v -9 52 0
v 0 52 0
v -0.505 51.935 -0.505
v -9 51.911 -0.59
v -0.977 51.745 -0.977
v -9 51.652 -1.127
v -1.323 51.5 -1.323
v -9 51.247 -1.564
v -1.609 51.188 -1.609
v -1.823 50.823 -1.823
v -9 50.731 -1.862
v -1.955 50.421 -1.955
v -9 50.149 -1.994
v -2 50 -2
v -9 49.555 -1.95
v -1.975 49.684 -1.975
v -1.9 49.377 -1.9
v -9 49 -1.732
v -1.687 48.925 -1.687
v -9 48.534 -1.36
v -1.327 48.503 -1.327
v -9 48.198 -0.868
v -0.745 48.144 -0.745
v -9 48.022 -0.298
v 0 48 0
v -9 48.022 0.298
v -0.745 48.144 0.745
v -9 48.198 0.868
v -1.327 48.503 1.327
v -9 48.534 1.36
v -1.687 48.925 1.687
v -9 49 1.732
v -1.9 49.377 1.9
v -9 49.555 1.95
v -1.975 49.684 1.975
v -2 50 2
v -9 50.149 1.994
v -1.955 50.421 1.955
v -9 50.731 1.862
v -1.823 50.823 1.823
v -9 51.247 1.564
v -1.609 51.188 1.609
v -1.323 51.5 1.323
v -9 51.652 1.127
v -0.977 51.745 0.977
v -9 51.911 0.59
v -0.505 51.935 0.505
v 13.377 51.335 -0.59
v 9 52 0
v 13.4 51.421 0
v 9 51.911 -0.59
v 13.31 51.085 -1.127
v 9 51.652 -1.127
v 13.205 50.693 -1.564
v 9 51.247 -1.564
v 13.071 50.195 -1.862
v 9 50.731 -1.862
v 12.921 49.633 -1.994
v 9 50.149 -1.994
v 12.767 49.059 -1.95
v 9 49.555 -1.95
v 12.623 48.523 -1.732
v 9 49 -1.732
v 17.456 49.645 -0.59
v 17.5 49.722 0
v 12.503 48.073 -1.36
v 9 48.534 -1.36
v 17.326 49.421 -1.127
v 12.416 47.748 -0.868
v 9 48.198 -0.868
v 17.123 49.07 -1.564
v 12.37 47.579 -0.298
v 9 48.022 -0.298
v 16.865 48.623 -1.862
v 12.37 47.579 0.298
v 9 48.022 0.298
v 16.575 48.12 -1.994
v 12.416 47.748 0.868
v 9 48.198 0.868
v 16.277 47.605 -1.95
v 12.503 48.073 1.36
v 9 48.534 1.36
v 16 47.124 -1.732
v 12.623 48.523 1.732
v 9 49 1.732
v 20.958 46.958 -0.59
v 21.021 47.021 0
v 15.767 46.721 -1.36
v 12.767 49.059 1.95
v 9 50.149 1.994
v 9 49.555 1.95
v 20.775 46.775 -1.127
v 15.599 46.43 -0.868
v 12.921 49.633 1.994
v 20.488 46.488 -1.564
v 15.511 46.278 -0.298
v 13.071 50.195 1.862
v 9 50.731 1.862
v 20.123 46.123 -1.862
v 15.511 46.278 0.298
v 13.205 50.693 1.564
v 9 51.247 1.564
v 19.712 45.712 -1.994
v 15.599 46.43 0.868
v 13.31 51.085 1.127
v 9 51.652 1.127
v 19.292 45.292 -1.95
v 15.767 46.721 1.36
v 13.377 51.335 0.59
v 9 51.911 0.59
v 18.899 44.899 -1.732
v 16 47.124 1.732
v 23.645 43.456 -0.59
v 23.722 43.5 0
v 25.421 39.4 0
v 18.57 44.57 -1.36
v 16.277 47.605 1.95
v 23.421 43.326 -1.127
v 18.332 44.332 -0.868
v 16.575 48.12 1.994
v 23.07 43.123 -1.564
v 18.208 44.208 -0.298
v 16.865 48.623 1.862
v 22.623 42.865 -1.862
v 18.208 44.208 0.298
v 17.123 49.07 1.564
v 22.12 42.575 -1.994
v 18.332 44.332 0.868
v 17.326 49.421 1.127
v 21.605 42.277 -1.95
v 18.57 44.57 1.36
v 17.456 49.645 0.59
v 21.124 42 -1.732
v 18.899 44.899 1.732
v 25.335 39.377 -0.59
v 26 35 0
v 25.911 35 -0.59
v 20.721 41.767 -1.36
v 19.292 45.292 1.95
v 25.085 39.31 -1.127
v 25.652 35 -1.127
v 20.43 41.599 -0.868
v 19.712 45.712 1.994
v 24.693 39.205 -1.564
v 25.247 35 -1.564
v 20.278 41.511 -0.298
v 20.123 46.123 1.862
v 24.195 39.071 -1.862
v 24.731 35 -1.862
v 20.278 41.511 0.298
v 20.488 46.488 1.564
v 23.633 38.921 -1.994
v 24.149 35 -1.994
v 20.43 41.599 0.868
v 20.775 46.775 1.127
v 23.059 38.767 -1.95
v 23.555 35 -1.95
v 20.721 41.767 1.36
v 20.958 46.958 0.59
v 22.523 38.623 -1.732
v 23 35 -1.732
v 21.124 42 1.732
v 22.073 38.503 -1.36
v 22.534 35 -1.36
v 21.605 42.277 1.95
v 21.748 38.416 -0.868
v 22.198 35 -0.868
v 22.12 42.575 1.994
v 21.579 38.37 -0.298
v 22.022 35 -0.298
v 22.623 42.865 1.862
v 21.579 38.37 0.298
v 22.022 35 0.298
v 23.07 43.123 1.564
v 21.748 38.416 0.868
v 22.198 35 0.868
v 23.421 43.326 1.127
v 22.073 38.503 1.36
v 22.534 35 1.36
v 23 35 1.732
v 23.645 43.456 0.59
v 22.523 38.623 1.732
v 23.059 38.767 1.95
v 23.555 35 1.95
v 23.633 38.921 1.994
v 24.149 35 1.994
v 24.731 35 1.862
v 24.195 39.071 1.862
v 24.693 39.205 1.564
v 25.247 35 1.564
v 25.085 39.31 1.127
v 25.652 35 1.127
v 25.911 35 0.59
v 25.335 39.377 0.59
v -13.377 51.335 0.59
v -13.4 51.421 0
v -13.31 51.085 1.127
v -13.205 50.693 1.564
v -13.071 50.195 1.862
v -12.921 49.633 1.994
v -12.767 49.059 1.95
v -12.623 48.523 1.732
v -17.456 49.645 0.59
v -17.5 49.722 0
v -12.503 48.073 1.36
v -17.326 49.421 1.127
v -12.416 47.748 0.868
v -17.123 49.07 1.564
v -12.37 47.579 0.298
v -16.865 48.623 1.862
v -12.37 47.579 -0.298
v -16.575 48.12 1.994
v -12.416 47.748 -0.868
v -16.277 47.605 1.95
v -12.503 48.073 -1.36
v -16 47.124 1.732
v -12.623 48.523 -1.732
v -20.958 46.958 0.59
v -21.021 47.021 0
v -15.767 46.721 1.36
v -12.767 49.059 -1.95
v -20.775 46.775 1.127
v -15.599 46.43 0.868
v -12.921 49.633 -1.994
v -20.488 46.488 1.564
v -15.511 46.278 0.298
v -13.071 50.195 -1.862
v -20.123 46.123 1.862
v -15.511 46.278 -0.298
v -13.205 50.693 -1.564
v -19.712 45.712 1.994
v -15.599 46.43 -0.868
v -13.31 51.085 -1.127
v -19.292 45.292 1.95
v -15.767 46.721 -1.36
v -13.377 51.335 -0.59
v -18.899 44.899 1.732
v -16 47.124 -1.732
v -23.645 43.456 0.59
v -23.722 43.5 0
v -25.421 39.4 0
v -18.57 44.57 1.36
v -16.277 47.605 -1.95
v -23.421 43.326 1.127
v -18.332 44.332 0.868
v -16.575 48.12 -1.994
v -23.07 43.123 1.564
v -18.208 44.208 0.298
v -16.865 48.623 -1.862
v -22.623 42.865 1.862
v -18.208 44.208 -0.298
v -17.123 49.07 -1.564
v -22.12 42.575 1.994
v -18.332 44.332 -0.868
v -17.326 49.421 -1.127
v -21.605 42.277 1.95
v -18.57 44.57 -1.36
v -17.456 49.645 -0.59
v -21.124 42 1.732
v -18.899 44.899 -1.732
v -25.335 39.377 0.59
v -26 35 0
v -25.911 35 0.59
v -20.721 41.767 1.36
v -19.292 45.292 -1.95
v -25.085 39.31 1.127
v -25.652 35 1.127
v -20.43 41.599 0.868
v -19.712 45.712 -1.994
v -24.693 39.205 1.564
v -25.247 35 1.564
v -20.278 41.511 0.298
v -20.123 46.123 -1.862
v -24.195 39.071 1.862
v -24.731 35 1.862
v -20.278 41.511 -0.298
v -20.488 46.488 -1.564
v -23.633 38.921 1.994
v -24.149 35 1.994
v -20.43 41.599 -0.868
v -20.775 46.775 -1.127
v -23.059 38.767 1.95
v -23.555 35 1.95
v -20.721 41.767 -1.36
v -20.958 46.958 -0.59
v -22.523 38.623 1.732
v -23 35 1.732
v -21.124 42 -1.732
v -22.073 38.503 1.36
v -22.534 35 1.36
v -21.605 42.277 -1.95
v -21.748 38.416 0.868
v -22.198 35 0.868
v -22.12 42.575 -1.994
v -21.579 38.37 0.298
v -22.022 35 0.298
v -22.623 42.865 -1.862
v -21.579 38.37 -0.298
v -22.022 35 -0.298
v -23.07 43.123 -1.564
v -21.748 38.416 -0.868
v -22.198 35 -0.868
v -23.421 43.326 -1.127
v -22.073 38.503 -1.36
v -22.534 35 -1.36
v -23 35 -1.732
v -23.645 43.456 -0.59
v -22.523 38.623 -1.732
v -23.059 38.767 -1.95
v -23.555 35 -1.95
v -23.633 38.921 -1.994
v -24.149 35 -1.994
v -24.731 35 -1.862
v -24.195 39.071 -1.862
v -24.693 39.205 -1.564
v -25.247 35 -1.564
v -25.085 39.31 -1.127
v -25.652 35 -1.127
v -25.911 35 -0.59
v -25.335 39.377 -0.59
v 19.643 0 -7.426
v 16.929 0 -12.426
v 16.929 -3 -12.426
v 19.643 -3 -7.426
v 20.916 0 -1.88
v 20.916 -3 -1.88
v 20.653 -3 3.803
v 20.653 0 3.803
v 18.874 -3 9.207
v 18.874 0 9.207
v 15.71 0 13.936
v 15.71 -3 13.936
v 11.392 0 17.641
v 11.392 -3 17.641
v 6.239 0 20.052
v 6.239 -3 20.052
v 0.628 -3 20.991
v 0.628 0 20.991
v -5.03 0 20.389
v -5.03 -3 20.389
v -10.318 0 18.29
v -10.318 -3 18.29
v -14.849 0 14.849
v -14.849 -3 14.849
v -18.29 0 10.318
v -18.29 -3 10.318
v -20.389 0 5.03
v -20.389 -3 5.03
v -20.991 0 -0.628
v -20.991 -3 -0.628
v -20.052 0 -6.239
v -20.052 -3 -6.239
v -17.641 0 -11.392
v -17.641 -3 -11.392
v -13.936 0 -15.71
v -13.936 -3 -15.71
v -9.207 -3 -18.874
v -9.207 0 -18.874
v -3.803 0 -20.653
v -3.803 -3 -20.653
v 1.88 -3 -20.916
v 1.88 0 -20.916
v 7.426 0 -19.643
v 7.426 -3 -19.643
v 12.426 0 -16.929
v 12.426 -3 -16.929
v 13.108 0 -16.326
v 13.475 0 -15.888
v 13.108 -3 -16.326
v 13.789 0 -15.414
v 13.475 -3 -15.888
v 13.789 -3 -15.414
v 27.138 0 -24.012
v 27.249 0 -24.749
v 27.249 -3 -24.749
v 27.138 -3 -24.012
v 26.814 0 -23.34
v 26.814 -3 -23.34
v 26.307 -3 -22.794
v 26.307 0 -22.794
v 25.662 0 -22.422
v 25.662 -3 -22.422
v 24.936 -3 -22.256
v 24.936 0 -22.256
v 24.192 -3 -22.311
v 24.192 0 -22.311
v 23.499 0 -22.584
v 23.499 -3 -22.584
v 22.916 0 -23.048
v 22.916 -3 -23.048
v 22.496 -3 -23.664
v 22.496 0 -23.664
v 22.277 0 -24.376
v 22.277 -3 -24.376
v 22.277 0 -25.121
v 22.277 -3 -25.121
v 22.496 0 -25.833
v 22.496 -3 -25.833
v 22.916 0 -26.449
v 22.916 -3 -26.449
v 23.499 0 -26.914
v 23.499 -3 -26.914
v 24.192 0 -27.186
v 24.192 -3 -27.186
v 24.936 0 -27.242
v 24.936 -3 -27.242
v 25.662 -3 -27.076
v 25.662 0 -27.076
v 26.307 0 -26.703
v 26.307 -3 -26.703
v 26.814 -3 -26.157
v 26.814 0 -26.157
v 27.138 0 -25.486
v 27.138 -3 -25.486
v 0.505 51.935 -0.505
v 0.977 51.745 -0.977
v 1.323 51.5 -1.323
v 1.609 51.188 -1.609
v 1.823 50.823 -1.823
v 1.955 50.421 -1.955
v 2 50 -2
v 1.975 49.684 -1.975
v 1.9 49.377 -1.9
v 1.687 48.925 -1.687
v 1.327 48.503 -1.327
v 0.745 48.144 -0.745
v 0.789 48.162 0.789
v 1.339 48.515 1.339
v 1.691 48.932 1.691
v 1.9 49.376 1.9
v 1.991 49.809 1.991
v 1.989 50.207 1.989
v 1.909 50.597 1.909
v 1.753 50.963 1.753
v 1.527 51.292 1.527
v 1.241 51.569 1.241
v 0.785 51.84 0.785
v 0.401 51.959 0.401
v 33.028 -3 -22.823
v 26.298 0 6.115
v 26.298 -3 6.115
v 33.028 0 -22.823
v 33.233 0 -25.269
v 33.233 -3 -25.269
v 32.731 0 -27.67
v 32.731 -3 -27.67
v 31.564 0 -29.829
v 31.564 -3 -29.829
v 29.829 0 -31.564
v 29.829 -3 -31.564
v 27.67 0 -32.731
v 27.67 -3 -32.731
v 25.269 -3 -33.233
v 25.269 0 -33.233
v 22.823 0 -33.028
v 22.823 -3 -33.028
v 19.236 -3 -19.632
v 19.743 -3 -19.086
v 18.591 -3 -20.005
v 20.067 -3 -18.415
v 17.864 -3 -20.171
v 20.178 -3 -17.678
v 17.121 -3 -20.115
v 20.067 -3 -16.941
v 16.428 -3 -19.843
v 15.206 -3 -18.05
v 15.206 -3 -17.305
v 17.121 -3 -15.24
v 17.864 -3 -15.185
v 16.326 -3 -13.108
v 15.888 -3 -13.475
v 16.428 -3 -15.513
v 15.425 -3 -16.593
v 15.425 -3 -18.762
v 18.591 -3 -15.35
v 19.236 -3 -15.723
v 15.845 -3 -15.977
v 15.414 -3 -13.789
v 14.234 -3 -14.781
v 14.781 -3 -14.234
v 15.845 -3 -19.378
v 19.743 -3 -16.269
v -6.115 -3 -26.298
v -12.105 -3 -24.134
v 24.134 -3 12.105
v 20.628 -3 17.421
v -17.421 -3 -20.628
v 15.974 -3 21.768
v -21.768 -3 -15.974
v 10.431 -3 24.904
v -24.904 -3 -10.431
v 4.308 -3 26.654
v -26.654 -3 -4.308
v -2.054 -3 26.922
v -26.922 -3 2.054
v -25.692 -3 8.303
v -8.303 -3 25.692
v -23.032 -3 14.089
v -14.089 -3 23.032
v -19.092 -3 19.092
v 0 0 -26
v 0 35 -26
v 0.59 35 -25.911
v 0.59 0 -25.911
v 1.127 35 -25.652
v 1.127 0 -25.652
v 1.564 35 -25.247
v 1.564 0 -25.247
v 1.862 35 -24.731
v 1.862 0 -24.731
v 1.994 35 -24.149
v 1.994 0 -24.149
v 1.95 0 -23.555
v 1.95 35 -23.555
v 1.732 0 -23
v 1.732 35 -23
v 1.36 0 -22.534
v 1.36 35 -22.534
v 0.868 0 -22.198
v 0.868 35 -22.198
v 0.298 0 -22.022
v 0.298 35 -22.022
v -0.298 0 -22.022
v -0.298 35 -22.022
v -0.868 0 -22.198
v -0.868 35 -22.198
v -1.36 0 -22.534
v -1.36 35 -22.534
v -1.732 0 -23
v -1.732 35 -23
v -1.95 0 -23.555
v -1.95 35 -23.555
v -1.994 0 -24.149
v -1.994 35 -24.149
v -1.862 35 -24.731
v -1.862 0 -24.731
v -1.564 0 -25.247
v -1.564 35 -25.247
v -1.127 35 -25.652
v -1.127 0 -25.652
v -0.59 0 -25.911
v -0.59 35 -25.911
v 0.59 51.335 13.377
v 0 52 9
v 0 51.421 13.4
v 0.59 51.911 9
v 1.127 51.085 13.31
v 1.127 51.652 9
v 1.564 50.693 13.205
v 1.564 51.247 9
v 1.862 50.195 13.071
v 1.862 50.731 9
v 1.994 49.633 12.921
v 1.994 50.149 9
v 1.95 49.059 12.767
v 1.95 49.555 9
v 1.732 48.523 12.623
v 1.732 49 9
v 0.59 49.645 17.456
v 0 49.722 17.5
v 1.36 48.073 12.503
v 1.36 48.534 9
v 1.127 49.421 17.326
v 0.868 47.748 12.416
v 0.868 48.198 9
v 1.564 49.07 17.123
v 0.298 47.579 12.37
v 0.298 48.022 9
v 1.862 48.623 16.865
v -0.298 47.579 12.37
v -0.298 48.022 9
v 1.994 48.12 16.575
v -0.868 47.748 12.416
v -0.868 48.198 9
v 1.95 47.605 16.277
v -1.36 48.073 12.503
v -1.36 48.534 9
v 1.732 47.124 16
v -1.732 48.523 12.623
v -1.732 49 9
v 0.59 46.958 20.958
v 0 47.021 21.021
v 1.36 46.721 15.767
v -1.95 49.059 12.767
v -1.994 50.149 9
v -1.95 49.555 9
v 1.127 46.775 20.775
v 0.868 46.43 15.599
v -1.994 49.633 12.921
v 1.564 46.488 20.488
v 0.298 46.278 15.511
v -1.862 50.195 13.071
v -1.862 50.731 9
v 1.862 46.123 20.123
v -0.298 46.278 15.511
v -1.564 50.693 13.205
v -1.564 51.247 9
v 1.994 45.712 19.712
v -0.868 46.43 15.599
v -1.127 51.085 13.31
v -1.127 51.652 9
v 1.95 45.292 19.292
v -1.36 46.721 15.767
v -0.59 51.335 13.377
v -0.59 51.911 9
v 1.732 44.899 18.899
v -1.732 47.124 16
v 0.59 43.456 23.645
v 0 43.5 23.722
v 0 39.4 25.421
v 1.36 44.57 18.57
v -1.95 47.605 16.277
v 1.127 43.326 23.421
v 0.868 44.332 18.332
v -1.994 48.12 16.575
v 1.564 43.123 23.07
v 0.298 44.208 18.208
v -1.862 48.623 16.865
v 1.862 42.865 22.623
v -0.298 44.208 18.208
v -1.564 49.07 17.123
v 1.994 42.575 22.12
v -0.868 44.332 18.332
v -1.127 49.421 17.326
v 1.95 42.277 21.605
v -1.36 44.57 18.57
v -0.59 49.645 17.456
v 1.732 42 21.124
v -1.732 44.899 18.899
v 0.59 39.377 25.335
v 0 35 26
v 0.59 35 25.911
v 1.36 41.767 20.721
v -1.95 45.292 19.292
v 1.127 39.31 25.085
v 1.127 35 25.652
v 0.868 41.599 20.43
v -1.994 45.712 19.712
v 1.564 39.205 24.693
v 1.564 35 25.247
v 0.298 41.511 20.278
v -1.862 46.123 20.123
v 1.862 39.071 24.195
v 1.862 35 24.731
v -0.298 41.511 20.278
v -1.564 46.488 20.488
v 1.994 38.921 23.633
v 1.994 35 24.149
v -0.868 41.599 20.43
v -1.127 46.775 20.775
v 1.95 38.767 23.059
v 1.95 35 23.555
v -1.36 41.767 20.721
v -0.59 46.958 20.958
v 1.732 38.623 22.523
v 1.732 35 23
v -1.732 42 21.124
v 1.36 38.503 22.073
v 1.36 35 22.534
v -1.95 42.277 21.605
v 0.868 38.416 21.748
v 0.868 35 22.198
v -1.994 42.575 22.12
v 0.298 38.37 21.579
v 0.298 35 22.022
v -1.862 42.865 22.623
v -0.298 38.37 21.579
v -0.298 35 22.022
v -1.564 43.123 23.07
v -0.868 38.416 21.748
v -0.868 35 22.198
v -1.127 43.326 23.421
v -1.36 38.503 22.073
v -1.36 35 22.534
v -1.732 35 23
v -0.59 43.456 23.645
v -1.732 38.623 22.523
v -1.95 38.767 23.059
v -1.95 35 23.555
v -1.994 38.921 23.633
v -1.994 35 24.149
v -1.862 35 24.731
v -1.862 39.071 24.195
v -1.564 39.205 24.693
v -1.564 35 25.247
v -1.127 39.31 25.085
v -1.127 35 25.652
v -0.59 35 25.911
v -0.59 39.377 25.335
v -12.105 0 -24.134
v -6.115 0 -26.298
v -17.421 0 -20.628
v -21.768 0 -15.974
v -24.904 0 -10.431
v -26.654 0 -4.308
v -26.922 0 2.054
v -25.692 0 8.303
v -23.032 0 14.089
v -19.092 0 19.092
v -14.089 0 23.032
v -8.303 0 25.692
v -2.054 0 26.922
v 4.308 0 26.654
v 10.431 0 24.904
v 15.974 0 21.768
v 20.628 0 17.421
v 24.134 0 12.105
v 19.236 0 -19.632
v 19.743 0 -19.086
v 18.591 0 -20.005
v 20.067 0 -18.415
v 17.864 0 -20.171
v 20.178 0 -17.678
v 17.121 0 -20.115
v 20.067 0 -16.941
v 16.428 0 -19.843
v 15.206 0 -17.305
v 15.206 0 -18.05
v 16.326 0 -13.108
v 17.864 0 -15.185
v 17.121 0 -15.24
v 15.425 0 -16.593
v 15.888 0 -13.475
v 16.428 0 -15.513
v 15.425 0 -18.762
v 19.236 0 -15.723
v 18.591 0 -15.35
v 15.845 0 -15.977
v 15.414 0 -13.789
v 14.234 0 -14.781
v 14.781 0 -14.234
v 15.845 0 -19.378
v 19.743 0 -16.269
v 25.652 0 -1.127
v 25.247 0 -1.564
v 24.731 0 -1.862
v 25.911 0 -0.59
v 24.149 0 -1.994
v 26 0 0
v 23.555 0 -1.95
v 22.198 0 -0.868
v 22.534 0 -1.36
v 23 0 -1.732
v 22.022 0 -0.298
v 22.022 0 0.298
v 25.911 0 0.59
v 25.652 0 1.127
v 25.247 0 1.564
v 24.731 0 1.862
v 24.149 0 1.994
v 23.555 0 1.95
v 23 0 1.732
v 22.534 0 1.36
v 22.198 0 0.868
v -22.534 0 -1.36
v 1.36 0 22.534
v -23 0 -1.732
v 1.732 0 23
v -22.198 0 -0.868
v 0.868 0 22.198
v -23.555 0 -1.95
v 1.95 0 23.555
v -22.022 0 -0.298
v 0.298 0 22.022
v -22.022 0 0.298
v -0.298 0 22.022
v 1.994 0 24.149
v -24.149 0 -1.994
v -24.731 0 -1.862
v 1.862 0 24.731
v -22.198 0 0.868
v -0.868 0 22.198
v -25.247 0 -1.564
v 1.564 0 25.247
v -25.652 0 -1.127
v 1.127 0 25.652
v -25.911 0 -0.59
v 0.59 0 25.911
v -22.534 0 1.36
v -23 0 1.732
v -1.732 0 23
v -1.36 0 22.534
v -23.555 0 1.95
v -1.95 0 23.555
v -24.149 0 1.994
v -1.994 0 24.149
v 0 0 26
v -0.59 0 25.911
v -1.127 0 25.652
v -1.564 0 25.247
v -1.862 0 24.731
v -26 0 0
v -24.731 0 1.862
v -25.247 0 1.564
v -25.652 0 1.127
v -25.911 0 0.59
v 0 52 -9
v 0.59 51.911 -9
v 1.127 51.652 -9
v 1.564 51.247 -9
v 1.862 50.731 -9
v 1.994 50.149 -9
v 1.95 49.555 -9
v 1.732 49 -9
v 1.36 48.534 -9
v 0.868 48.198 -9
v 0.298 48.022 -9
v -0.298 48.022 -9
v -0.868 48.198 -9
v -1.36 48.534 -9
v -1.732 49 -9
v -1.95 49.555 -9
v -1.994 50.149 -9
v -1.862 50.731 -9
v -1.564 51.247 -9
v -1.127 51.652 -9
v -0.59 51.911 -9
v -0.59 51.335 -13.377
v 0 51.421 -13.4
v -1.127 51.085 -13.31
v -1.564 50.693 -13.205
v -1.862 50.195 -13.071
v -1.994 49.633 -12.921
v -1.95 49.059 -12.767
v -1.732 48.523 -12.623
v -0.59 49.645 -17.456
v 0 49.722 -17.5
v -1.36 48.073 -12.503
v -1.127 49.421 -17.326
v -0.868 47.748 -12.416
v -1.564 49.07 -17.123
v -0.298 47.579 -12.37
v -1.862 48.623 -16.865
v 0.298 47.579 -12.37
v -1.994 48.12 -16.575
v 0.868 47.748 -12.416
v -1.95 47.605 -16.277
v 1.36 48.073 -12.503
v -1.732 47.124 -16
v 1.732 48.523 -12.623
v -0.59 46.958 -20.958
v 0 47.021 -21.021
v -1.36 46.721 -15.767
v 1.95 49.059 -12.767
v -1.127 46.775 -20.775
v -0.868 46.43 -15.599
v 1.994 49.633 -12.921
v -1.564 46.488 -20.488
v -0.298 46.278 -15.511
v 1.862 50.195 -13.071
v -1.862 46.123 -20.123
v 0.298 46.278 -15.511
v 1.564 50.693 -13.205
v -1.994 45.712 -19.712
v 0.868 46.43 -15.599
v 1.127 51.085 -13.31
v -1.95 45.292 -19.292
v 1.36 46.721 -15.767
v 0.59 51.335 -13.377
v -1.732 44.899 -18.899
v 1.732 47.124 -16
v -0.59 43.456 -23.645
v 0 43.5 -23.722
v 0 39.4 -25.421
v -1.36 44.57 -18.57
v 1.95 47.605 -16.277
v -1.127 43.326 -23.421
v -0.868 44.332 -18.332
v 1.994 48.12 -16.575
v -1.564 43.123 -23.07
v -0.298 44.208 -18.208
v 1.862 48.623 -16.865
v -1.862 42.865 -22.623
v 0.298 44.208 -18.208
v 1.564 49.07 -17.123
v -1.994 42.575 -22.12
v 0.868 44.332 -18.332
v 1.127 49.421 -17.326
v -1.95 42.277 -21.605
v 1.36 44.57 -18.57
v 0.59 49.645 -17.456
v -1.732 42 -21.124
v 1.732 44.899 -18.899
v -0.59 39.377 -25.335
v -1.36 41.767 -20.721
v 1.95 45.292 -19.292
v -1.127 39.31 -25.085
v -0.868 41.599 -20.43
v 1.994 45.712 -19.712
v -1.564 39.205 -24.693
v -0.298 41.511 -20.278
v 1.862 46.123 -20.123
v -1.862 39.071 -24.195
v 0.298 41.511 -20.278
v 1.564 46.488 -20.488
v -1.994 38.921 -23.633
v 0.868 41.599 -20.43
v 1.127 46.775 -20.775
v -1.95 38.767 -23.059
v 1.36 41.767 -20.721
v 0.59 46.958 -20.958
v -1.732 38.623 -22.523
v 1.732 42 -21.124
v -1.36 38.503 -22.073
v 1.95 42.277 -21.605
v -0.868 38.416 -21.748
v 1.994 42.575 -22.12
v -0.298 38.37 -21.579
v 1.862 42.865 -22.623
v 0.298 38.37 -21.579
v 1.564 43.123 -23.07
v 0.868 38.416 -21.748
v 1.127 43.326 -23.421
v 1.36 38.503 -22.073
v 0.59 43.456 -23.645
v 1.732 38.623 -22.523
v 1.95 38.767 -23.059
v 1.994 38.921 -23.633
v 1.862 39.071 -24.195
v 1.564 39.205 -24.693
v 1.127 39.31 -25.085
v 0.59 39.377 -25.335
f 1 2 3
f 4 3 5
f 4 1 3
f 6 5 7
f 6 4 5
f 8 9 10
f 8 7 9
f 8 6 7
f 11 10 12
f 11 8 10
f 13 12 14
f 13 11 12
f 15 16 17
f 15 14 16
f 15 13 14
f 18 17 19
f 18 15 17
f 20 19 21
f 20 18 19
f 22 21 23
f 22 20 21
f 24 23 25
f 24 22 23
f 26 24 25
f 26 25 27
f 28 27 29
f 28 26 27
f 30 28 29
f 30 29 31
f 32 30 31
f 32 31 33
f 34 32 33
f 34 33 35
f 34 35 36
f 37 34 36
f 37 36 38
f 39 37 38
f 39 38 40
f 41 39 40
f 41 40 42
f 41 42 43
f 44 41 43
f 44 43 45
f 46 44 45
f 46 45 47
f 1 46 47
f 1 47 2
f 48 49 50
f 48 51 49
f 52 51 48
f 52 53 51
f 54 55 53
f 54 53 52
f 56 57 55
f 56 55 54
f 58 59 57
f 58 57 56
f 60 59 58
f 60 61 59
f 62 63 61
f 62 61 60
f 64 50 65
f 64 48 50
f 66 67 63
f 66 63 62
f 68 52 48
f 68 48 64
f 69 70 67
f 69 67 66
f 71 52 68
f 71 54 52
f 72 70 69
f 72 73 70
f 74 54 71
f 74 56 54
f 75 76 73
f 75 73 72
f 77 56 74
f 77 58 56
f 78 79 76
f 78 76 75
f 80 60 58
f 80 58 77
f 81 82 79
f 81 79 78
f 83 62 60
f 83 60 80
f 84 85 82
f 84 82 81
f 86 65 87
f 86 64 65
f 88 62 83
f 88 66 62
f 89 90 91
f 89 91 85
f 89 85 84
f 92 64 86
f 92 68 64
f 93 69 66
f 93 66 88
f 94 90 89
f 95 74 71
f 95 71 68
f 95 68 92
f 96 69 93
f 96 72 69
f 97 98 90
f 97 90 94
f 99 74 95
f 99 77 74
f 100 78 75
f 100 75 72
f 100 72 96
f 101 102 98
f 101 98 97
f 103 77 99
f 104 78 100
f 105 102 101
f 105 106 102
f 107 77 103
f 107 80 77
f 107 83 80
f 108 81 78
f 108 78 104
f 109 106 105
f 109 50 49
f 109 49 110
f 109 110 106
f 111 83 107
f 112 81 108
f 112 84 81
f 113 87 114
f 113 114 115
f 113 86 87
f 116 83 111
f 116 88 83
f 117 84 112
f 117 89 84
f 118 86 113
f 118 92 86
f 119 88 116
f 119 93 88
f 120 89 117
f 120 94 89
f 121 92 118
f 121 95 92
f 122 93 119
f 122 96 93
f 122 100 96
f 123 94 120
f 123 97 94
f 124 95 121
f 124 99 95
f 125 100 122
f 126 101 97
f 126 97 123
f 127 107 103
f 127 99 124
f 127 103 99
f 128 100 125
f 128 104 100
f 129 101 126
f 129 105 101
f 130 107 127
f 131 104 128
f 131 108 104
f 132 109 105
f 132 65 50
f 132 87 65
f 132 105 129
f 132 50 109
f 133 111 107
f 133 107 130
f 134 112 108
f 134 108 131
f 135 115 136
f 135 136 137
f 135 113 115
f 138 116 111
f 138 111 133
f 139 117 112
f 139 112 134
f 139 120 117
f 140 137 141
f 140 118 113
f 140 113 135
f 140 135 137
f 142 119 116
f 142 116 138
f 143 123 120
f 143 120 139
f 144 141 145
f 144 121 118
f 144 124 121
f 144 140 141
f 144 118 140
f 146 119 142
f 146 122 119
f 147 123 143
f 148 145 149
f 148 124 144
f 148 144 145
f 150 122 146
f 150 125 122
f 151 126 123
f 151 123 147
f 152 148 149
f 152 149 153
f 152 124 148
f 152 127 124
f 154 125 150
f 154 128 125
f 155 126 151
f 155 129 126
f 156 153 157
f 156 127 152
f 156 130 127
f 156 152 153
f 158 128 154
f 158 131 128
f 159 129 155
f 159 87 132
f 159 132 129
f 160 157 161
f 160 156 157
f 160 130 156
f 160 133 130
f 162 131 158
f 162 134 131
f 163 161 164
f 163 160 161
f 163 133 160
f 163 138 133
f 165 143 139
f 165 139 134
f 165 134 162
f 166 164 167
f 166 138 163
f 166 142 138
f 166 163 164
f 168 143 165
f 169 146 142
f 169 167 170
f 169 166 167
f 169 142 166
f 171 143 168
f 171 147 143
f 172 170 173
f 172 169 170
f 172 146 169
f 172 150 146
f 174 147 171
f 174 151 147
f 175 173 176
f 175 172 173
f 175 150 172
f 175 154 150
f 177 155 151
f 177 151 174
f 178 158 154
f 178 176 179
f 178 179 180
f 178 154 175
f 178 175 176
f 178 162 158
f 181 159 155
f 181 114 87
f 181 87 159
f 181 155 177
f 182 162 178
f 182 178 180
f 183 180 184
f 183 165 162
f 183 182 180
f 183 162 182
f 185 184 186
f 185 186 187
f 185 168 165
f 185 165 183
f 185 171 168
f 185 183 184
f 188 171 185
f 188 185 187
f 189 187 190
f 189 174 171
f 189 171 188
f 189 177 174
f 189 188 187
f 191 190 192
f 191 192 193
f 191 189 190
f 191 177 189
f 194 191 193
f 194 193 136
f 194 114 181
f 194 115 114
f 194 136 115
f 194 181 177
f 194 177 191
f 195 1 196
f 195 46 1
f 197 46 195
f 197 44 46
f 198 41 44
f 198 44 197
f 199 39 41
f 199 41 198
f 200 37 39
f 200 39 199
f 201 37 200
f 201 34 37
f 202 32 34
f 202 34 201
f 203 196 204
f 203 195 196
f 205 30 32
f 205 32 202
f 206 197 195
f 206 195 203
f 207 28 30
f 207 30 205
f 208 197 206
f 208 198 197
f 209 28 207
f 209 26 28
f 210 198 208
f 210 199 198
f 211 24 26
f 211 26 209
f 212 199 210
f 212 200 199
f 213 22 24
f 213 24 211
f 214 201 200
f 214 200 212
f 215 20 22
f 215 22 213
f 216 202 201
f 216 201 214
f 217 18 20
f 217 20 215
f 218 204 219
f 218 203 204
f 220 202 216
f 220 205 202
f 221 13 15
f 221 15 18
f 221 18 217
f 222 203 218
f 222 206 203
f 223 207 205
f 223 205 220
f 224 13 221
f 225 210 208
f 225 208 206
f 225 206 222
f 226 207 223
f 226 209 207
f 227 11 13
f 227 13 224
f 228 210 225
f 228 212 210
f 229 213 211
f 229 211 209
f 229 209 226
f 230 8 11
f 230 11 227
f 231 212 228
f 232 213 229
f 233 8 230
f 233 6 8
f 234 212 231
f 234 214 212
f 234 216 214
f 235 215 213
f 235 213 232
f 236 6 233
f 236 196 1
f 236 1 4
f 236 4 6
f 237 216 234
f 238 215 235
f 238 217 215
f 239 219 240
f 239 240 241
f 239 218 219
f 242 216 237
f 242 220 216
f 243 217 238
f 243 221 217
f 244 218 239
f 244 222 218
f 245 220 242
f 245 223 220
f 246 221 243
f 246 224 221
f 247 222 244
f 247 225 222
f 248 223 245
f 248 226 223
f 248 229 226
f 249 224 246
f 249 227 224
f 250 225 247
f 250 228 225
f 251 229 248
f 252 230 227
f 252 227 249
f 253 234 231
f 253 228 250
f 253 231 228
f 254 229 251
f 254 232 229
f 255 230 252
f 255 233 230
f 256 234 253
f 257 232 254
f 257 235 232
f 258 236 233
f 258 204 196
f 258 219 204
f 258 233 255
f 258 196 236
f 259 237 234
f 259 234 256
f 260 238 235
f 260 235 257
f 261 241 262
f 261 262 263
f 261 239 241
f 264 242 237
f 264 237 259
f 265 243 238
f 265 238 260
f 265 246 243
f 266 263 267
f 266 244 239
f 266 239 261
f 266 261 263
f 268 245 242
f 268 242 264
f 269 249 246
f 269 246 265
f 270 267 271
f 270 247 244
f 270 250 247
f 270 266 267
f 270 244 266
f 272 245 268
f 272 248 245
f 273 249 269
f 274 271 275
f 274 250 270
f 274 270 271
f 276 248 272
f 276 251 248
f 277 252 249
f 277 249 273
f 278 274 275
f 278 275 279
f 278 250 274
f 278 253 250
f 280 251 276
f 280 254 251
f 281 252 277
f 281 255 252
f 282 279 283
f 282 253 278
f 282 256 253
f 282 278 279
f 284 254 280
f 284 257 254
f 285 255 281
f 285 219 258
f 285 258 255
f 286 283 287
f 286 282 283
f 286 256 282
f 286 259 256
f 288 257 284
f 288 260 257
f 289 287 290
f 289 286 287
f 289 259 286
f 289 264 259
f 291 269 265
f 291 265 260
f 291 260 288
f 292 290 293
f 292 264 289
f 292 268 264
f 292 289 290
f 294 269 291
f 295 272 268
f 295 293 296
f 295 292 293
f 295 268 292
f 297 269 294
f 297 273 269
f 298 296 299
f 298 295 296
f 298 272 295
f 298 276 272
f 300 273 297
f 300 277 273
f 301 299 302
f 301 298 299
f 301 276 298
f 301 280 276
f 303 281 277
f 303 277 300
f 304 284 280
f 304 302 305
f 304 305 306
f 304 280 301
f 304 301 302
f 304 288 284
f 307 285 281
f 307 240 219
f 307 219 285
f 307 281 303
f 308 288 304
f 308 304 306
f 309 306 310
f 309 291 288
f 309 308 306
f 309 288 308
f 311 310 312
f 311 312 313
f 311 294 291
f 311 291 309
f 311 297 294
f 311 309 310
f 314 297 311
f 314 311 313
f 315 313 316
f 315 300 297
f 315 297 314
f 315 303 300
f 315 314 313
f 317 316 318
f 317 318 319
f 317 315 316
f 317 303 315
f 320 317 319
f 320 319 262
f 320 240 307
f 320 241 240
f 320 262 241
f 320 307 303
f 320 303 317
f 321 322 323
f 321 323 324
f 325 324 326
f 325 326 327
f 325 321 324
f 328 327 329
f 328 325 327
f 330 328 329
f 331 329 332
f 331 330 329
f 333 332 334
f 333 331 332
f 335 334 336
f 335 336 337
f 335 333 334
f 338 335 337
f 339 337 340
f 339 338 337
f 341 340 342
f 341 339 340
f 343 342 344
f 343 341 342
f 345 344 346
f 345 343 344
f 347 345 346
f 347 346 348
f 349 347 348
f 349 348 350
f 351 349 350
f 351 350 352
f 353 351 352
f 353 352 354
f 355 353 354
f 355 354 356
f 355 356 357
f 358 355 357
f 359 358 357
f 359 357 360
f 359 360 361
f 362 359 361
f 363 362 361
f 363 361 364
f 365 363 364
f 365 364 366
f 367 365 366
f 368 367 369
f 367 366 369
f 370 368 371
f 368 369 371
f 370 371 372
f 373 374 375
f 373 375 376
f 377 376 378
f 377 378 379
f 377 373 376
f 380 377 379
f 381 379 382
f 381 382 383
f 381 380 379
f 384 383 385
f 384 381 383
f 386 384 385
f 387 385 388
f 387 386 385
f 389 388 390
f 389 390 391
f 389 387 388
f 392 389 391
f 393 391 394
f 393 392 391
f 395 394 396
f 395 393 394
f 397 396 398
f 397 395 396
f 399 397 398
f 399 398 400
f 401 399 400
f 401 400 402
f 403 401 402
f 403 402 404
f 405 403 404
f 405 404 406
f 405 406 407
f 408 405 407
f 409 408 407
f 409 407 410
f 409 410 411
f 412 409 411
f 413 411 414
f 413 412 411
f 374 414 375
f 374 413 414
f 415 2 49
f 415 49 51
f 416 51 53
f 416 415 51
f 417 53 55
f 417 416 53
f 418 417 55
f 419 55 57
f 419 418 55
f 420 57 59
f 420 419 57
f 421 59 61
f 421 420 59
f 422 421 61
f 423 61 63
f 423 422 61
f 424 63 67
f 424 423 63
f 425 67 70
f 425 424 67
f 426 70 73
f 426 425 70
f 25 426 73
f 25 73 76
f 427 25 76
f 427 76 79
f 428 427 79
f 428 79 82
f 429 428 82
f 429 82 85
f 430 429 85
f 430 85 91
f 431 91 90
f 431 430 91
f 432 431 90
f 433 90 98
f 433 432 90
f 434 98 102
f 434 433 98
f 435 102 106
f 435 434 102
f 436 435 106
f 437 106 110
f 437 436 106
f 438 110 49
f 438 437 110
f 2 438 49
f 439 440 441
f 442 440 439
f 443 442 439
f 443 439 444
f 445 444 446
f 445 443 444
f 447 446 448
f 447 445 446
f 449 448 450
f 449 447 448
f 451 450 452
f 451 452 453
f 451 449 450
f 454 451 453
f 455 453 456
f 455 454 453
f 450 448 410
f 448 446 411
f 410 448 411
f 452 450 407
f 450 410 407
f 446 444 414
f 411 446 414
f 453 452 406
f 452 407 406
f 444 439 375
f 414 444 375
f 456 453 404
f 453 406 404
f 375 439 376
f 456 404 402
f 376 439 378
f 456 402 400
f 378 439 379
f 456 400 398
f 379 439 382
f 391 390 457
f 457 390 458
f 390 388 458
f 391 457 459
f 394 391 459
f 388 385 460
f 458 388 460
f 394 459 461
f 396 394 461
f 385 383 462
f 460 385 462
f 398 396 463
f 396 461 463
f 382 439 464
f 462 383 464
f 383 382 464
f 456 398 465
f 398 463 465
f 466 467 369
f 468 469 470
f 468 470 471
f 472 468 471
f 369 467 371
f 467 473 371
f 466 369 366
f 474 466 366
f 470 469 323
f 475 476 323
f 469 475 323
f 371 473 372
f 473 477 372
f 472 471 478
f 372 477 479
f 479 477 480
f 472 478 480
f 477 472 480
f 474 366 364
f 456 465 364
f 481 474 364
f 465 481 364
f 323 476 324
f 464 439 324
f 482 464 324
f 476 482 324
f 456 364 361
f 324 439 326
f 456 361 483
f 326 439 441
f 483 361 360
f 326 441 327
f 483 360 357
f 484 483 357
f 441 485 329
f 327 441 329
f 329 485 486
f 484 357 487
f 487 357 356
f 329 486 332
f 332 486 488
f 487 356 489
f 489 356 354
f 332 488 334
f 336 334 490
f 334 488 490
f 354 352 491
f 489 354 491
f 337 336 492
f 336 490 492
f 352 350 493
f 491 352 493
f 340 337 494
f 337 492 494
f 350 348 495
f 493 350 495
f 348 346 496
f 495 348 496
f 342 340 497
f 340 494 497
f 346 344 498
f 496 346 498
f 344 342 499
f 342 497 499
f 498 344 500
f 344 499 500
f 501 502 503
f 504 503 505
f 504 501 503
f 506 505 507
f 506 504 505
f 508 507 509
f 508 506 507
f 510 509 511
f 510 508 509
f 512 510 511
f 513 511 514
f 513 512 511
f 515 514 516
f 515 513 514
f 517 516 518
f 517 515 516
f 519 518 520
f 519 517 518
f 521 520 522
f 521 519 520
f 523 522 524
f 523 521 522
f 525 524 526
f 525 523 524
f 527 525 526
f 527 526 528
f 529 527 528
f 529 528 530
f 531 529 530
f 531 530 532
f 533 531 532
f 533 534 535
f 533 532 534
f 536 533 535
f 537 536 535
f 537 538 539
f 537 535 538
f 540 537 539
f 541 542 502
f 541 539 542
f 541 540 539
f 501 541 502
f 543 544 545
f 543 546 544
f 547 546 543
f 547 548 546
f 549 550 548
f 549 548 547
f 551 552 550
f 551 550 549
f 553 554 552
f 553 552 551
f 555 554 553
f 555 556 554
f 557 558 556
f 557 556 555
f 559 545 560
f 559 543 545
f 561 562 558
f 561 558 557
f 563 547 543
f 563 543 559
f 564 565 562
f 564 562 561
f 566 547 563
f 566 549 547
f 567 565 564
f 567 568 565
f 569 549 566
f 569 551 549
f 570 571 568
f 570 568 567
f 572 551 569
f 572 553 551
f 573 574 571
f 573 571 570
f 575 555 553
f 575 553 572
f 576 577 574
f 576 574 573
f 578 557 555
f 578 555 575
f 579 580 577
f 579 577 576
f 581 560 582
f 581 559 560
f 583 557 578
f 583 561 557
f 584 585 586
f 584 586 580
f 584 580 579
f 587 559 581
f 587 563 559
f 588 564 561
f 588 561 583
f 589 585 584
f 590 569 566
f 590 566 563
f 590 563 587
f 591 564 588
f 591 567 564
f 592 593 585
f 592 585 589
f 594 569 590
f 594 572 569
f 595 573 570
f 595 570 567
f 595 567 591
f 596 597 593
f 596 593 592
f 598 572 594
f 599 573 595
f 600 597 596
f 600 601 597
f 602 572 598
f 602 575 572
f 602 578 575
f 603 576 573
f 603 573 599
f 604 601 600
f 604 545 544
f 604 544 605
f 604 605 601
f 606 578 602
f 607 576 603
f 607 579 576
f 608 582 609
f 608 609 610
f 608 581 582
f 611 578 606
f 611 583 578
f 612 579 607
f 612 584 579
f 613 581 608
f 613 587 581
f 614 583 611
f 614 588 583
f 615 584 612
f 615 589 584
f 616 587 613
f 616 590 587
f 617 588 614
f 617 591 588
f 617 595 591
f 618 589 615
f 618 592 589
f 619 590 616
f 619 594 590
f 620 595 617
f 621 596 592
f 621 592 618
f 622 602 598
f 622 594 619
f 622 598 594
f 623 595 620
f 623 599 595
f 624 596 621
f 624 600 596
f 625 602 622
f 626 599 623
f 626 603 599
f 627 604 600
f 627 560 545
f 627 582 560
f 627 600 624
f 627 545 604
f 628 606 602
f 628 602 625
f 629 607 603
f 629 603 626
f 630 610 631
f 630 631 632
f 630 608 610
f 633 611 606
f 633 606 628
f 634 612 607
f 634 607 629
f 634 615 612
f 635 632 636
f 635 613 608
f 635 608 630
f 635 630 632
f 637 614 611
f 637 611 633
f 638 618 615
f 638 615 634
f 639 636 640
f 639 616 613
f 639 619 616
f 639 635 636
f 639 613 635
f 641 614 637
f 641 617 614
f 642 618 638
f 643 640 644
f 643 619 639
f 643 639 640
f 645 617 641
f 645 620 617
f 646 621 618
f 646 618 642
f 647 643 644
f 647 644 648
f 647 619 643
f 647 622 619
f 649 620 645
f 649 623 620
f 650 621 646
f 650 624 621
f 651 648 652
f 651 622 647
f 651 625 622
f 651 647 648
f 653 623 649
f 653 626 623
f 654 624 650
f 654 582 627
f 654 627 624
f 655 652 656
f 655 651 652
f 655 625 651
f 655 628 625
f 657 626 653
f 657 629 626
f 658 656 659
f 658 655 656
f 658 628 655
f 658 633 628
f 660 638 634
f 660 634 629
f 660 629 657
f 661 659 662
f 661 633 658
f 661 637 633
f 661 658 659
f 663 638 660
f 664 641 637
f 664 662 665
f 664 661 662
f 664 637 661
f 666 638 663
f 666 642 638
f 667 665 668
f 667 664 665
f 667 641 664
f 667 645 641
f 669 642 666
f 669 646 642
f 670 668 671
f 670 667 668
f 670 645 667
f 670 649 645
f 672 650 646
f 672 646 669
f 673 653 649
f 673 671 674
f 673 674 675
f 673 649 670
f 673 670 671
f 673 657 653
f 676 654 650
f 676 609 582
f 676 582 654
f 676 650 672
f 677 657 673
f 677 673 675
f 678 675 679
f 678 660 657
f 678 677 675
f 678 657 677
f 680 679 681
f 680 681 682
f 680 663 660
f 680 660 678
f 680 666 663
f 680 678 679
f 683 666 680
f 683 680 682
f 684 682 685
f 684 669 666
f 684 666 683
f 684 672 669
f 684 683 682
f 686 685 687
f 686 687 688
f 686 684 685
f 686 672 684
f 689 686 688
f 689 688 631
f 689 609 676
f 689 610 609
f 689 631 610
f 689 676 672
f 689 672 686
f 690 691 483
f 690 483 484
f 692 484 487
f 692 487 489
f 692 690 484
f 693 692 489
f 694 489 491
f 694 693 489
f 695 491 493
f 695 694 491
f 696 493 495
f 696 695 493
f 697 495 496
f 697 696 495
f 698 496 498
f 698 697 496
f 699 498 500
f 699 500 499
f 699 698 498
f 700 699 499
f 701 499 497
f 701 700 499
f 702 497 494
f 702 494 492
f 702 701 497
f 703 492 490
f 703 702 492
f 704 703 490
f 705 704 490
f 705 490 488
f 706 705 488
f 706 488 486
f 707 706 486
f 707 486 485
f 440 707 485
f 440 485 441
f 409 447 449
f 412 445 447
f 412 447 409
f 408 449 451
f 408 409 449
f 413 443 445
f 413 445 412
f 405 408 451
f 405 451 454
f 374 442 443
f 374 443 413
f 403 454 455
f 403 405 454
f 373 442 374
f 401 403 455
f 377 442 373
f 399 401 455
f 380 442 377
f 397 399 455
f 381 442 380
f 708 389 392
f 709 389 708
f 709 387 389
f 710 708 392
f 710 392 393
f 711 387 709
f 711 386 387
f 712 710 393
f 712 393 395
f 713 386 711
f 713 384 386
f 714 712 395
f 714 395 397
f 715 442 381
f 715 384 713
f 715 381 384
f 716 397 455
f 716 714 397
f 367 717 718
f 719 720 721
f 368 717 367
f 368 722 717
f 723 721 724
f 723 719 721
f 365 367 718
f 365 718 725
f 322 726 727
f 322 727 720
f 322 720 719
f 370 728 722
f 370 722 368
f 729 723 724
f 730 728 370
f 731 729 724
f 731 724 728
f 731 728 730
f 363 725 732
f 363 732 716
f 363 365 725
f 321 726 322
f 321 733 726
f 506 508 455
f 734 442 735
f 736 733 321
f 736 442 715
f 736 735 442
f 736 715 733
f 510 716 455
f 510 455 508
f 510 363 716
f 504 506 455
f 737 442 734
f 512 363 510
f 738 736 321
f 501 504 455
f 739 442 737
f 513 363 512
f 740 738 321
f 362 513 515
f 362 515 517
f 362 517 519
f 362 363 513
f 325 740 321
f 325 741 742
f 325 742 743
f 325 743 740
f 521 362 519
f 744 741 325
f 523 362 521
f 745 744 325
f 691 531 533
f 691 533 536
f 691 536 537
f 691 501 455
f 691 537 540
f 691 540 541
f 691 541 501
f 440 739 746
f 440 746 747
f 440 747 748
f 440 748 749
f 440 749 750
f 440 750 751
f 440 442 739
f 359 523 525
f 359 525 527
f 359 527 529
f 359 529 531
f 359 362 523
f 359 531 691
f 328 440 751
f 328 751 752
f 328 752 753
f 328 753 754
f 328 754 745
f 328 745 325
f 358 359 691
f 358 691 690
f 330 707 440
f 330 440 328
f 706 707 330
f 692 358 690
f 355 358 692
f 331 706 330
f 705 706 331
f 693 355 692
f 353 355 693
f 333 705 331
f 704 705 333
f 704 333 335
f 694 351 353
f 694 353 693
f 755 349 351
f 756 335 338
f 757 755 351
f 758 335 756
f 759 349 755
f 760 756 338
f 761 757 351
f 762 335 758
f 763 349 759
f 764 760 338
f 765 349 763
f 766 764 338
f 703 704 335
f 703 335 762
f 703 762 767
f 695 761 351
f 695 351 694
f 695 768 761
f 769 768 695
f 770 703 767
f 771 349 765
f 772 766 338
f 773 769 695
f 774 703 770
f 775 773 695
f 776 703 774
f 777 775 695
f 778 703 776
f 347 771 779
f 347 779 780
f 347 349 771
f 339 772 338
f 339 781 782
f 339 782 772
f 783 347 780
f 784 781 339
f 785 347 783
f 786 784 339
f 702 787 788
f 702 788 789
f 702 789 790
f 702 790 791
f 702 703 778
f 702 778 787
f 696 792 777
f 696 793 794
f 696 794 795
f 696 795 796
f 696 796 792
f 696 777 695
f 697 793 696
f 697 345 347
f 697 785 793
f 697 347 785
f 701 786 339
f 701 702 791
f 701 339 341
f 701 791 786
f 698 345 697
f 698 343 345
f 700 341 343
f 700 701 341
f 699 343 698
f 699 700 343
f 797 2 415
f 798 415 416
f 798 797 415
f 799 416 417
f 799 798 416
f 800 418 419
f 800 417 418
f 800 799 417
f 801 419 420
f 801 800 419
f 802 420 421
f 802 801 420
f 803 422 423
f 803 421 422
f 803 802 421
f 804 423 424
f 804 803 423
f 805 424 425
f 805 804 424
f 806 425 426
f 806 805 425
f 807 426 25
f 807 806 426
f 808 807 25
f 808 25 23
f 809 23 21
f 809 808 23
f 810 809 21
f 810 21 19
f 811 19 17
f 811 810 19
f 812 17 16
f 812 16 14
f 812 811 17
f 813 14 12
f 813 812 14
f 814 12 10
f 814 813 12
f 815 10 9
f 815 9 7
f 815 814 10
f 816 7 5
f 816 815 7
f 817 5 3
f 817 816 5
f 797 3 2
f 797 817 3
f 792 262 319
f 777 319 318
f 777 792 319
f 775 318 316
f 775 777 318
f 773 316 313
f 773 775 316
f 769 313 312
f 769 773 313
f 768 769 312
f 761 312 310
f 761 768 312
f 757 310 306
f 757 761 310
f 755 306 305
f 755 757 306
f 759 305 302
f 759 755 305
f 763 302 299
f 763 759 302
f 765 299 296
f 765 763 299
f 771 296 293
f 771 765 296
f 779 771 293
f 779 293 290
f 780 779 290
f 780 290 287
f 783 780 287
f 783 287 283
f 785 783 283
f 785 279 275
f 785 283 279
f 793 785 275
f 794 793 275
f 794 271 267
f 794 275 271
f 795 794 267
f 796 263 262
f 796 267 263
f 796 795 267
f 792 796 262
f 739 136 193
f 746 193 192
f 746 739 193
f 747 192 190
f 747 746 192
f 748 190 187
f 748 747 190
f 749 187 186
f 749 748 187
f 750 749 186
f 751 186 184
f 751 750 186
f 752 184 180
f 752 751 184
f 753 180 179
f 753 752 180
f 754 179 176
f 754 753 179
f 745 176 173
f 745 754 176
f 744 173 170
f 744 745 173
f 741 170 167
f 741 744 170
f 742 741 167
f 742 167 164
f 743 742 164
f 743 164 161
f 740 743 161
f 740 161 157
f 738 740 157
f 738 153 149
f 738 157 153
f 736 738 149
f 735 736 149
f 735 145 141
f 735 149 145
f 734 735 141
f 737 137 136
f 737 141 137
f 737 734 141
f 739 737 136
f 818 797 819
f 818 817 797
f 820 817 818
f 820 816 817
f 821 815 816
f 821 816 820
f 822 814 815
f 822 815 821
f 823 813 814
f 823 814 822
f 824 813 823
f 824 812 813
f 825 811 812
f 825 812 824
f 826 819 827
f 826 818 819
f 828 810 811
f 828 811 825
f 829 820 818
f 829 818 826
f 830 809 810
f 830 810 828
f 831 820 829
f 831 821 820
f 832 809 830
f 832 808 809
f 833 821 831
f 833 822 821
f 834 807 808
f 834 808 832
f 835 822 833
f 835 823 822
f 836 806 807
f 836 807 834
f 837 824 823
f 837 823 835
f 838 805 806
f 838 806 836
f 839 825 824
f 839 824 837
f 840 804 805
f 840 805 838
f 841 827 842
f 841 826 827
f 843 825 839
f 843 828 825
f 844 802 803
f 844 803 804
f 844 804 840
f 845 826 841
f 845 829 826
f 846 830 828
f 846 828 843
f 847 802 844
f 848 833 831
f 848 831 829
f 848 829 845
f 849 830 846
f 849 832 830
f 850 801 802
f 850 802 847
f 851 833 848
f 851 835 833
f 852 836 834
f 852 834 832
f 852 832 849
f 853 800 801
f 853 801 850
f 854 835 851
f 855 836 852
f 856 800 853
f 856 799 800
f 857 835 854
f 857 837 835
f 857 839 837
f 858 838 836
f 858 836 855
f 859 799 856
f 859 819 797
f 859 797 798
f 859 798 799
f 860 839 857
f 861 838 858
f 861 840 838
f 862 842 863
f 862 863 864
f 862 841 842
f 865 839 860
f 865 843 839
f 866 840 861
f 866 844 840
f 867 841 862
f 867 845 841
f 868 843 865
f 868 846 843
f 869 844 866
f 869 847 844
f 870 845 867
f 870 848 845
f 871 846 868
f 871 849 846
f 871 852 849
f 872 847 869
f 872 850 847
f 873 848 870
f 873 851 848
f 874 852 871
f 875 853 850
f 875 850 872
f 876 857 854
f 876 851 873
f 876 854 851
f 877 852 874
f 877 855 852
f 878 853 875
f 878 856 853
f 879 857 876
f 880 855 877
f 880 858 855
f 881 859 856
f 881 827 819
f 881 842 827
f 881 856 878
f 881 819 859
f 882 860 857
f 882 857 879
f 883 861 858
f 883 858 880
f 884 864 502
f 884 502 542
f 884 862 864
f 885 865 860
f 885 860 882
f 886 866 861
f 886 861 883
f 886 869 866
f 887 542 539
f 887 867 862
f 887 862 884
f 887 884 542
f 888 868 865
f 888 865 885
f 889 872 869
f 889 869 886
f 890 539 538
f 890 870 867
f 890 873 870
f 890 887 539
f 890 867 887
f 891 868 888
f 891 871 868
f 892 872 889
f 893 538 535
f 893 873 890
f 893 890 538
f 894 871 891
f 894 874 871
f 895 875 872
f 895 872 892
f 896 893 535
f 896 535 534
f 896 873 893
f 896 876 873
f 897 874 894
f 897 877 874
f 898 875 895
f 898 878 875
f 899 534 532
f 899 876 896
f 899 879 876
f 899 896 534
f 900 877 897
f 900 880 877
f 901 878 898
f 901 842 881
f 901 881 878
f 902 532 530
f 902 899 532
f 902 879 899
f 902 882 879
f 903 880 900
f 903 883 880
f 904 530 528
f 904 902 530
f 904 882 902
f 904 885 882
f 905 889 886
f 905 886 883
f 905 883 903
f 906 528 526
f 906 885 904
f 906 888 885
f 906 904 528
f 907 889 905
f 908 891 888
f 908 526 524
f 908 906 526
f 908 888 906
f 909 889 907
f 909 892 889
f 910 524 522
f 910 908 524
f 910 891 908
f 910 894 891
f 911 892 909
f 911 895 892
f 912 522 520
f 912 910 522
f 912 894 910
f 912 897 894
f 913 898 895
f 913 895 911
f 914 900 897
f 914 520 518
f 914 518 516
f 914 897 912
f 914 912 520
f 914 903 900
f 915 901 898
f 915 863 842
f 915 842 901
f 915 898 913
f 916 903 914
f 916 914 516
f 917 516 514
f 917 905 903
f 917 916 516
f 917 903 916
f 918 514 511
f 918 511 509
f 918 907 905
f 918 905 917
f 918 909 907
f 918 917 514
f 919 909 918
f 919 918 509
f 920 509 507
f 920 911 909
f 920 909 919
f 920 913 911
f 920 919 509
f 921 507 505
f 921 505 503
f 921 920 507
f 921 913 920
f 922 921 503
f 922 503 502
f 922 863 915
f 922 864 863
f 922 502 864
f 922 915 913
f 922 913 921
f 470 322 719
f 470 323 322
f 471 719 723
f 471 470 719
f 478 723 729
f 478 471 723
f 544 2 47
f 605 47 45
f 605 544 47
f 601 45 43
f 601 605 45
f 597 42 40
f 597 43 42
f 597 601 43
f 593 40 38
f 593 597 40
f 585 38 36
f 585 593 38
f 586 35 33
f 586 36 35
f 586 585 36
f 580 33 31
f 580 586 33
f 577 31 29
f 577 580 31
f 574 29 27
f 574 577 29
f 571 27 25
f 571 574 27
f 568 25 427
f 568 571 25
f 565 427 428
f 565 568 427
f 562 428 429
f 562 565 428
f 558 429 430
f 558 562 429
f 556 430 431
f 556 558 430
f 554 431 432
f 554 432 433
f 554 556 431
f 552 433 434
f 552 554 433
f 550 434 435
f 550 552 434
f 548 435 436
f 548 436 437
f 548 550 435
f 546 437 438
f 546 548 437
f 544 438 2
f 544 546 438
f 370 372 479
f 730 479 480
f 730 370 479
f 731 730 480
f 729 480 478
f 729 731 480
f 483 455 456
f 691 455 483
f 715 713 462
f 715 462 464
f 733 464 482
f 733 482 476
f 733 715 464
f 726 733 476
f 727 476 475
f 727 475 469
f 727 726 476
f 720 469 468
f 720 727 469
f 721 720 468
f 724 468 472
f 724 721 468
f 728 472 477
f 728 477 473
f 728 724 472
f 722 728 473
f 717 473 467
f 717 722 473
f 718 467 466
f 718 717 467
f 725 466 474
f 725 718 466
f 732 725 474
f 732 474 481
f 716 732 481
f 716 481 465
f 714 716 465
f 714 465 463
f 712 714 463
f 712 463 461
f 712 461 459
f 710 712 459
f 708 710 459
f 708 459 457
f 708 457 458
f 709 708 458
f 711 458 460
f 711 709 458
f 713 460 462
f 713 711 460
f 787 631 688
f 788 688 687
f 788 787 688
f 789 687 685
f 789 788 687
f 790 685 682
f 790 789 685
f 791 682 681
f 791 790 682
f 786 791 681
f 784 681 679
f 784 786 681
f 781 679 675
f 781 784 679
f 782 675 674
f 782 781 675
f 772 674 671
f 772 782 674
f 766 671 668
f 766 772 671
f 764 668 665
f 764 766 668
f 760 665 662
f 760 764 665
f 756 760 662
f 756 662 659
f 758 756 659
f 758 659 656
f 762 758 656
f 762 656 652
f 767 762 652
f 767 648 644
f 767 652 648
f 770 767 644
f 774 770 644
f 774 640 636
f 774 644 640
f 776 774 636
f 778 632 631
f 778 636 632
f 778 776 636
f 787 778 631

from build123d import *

# Parameters (mm, degrees)
ESQUISSE2_R                  = 2
R_P_TITION_CIRCULAIRE1_COUNT = 4
ESQUISSE4_R                  = 2.5
BOSS_EXTRU_1_DEPTH           = 3
CONG_1_R                     = 5


with BuildPart() as part:
    # Balayage1: sweep along a path in Esquisse1
    with BuildLine(Plane.XY) as balayage1_path:
        Line((0, 50), (9, 50))
        ThreePointArc((9, 50), (19.606601718, 45.606601718), (24, 35))
        Line((24, 35), (24, 0))
    # Esquisse2 → Balayage1 (sweep)
    with BuildSketch(Plane(origin=(0, 0, 0), x_dir=(1, 0, 0), z_dir=(0, 1, 0))):
        with Locations((24, 0)):
            Circle(ESQUISSE2_R)
    balayage1 = sweep(path=balayage1_path.line)

    # Répétition circulaire1: Balayage1 ×4 about axis
    r_p_tition_circulaire1_axis = Axis((0, 0, 0), (0, 1, 0))
    for i in range(1, R_P_TITION_CIRCULAIRE1_COUNT):
        add(balayage1.rotate(r_p_tition_circulaire1_axis, i * 360 / R_P_TITION_CIRCULAIRE1_COUNT))

    # Esquisse4 → Boss.-Extru.1 (add)
    with BuildSketch(Plane.XZ):
        with BuildLine():
            Line((26.298310212, 6.115462371), (33.027835001, -22.823499188))
            ThreePointArc((33.027835001, -22.823499188), (30.759144982, -30.759144982), (22.823499188, -33.027835001))
            Line((22.823499188, -33.027835001), (-6.115462371, -26.298310212))
            ThreePointArc((-6.115462371, -26.298310212), (-19.091883092, 19.091883092), (26.298310212, 6.115462371))
        make_face()
        with Locations((17.67766953, -17.67766953)):
            Circle(ESQUISSE4_R, mode=Mode.SUBTRACT)
        with Locations((24.748737342, -24.748737342)):
            Circle(ESQUISSE4_R, mode=Mode.SUBTRACT)
        with BuildLine():
            ThreePointArc((13.454452036, -16.123824621), (14.495689014, -14.495689014), (16.123824621, -13.454452036))
            ThreePointArc((16.123824621, -13.454452036), (-14.849242405, 14.849242405), (13.454452036, -16.123824621))
        make_face(mode=Mode.SUBTRACT)
    extrude(amount=BOSS_EXTRU_1_DEPTH)

    # Congé1
    cong_1_edges = [part.edges().sort_by_distance(p)[0] for p in [
        (13.454452036, -1.5, -16.123824621),
        (16.123824621, -1.5, -13.454452036),
    ]]
    fillet(cong_1_edges, radius=CONG_1_R)


solid = part.part
